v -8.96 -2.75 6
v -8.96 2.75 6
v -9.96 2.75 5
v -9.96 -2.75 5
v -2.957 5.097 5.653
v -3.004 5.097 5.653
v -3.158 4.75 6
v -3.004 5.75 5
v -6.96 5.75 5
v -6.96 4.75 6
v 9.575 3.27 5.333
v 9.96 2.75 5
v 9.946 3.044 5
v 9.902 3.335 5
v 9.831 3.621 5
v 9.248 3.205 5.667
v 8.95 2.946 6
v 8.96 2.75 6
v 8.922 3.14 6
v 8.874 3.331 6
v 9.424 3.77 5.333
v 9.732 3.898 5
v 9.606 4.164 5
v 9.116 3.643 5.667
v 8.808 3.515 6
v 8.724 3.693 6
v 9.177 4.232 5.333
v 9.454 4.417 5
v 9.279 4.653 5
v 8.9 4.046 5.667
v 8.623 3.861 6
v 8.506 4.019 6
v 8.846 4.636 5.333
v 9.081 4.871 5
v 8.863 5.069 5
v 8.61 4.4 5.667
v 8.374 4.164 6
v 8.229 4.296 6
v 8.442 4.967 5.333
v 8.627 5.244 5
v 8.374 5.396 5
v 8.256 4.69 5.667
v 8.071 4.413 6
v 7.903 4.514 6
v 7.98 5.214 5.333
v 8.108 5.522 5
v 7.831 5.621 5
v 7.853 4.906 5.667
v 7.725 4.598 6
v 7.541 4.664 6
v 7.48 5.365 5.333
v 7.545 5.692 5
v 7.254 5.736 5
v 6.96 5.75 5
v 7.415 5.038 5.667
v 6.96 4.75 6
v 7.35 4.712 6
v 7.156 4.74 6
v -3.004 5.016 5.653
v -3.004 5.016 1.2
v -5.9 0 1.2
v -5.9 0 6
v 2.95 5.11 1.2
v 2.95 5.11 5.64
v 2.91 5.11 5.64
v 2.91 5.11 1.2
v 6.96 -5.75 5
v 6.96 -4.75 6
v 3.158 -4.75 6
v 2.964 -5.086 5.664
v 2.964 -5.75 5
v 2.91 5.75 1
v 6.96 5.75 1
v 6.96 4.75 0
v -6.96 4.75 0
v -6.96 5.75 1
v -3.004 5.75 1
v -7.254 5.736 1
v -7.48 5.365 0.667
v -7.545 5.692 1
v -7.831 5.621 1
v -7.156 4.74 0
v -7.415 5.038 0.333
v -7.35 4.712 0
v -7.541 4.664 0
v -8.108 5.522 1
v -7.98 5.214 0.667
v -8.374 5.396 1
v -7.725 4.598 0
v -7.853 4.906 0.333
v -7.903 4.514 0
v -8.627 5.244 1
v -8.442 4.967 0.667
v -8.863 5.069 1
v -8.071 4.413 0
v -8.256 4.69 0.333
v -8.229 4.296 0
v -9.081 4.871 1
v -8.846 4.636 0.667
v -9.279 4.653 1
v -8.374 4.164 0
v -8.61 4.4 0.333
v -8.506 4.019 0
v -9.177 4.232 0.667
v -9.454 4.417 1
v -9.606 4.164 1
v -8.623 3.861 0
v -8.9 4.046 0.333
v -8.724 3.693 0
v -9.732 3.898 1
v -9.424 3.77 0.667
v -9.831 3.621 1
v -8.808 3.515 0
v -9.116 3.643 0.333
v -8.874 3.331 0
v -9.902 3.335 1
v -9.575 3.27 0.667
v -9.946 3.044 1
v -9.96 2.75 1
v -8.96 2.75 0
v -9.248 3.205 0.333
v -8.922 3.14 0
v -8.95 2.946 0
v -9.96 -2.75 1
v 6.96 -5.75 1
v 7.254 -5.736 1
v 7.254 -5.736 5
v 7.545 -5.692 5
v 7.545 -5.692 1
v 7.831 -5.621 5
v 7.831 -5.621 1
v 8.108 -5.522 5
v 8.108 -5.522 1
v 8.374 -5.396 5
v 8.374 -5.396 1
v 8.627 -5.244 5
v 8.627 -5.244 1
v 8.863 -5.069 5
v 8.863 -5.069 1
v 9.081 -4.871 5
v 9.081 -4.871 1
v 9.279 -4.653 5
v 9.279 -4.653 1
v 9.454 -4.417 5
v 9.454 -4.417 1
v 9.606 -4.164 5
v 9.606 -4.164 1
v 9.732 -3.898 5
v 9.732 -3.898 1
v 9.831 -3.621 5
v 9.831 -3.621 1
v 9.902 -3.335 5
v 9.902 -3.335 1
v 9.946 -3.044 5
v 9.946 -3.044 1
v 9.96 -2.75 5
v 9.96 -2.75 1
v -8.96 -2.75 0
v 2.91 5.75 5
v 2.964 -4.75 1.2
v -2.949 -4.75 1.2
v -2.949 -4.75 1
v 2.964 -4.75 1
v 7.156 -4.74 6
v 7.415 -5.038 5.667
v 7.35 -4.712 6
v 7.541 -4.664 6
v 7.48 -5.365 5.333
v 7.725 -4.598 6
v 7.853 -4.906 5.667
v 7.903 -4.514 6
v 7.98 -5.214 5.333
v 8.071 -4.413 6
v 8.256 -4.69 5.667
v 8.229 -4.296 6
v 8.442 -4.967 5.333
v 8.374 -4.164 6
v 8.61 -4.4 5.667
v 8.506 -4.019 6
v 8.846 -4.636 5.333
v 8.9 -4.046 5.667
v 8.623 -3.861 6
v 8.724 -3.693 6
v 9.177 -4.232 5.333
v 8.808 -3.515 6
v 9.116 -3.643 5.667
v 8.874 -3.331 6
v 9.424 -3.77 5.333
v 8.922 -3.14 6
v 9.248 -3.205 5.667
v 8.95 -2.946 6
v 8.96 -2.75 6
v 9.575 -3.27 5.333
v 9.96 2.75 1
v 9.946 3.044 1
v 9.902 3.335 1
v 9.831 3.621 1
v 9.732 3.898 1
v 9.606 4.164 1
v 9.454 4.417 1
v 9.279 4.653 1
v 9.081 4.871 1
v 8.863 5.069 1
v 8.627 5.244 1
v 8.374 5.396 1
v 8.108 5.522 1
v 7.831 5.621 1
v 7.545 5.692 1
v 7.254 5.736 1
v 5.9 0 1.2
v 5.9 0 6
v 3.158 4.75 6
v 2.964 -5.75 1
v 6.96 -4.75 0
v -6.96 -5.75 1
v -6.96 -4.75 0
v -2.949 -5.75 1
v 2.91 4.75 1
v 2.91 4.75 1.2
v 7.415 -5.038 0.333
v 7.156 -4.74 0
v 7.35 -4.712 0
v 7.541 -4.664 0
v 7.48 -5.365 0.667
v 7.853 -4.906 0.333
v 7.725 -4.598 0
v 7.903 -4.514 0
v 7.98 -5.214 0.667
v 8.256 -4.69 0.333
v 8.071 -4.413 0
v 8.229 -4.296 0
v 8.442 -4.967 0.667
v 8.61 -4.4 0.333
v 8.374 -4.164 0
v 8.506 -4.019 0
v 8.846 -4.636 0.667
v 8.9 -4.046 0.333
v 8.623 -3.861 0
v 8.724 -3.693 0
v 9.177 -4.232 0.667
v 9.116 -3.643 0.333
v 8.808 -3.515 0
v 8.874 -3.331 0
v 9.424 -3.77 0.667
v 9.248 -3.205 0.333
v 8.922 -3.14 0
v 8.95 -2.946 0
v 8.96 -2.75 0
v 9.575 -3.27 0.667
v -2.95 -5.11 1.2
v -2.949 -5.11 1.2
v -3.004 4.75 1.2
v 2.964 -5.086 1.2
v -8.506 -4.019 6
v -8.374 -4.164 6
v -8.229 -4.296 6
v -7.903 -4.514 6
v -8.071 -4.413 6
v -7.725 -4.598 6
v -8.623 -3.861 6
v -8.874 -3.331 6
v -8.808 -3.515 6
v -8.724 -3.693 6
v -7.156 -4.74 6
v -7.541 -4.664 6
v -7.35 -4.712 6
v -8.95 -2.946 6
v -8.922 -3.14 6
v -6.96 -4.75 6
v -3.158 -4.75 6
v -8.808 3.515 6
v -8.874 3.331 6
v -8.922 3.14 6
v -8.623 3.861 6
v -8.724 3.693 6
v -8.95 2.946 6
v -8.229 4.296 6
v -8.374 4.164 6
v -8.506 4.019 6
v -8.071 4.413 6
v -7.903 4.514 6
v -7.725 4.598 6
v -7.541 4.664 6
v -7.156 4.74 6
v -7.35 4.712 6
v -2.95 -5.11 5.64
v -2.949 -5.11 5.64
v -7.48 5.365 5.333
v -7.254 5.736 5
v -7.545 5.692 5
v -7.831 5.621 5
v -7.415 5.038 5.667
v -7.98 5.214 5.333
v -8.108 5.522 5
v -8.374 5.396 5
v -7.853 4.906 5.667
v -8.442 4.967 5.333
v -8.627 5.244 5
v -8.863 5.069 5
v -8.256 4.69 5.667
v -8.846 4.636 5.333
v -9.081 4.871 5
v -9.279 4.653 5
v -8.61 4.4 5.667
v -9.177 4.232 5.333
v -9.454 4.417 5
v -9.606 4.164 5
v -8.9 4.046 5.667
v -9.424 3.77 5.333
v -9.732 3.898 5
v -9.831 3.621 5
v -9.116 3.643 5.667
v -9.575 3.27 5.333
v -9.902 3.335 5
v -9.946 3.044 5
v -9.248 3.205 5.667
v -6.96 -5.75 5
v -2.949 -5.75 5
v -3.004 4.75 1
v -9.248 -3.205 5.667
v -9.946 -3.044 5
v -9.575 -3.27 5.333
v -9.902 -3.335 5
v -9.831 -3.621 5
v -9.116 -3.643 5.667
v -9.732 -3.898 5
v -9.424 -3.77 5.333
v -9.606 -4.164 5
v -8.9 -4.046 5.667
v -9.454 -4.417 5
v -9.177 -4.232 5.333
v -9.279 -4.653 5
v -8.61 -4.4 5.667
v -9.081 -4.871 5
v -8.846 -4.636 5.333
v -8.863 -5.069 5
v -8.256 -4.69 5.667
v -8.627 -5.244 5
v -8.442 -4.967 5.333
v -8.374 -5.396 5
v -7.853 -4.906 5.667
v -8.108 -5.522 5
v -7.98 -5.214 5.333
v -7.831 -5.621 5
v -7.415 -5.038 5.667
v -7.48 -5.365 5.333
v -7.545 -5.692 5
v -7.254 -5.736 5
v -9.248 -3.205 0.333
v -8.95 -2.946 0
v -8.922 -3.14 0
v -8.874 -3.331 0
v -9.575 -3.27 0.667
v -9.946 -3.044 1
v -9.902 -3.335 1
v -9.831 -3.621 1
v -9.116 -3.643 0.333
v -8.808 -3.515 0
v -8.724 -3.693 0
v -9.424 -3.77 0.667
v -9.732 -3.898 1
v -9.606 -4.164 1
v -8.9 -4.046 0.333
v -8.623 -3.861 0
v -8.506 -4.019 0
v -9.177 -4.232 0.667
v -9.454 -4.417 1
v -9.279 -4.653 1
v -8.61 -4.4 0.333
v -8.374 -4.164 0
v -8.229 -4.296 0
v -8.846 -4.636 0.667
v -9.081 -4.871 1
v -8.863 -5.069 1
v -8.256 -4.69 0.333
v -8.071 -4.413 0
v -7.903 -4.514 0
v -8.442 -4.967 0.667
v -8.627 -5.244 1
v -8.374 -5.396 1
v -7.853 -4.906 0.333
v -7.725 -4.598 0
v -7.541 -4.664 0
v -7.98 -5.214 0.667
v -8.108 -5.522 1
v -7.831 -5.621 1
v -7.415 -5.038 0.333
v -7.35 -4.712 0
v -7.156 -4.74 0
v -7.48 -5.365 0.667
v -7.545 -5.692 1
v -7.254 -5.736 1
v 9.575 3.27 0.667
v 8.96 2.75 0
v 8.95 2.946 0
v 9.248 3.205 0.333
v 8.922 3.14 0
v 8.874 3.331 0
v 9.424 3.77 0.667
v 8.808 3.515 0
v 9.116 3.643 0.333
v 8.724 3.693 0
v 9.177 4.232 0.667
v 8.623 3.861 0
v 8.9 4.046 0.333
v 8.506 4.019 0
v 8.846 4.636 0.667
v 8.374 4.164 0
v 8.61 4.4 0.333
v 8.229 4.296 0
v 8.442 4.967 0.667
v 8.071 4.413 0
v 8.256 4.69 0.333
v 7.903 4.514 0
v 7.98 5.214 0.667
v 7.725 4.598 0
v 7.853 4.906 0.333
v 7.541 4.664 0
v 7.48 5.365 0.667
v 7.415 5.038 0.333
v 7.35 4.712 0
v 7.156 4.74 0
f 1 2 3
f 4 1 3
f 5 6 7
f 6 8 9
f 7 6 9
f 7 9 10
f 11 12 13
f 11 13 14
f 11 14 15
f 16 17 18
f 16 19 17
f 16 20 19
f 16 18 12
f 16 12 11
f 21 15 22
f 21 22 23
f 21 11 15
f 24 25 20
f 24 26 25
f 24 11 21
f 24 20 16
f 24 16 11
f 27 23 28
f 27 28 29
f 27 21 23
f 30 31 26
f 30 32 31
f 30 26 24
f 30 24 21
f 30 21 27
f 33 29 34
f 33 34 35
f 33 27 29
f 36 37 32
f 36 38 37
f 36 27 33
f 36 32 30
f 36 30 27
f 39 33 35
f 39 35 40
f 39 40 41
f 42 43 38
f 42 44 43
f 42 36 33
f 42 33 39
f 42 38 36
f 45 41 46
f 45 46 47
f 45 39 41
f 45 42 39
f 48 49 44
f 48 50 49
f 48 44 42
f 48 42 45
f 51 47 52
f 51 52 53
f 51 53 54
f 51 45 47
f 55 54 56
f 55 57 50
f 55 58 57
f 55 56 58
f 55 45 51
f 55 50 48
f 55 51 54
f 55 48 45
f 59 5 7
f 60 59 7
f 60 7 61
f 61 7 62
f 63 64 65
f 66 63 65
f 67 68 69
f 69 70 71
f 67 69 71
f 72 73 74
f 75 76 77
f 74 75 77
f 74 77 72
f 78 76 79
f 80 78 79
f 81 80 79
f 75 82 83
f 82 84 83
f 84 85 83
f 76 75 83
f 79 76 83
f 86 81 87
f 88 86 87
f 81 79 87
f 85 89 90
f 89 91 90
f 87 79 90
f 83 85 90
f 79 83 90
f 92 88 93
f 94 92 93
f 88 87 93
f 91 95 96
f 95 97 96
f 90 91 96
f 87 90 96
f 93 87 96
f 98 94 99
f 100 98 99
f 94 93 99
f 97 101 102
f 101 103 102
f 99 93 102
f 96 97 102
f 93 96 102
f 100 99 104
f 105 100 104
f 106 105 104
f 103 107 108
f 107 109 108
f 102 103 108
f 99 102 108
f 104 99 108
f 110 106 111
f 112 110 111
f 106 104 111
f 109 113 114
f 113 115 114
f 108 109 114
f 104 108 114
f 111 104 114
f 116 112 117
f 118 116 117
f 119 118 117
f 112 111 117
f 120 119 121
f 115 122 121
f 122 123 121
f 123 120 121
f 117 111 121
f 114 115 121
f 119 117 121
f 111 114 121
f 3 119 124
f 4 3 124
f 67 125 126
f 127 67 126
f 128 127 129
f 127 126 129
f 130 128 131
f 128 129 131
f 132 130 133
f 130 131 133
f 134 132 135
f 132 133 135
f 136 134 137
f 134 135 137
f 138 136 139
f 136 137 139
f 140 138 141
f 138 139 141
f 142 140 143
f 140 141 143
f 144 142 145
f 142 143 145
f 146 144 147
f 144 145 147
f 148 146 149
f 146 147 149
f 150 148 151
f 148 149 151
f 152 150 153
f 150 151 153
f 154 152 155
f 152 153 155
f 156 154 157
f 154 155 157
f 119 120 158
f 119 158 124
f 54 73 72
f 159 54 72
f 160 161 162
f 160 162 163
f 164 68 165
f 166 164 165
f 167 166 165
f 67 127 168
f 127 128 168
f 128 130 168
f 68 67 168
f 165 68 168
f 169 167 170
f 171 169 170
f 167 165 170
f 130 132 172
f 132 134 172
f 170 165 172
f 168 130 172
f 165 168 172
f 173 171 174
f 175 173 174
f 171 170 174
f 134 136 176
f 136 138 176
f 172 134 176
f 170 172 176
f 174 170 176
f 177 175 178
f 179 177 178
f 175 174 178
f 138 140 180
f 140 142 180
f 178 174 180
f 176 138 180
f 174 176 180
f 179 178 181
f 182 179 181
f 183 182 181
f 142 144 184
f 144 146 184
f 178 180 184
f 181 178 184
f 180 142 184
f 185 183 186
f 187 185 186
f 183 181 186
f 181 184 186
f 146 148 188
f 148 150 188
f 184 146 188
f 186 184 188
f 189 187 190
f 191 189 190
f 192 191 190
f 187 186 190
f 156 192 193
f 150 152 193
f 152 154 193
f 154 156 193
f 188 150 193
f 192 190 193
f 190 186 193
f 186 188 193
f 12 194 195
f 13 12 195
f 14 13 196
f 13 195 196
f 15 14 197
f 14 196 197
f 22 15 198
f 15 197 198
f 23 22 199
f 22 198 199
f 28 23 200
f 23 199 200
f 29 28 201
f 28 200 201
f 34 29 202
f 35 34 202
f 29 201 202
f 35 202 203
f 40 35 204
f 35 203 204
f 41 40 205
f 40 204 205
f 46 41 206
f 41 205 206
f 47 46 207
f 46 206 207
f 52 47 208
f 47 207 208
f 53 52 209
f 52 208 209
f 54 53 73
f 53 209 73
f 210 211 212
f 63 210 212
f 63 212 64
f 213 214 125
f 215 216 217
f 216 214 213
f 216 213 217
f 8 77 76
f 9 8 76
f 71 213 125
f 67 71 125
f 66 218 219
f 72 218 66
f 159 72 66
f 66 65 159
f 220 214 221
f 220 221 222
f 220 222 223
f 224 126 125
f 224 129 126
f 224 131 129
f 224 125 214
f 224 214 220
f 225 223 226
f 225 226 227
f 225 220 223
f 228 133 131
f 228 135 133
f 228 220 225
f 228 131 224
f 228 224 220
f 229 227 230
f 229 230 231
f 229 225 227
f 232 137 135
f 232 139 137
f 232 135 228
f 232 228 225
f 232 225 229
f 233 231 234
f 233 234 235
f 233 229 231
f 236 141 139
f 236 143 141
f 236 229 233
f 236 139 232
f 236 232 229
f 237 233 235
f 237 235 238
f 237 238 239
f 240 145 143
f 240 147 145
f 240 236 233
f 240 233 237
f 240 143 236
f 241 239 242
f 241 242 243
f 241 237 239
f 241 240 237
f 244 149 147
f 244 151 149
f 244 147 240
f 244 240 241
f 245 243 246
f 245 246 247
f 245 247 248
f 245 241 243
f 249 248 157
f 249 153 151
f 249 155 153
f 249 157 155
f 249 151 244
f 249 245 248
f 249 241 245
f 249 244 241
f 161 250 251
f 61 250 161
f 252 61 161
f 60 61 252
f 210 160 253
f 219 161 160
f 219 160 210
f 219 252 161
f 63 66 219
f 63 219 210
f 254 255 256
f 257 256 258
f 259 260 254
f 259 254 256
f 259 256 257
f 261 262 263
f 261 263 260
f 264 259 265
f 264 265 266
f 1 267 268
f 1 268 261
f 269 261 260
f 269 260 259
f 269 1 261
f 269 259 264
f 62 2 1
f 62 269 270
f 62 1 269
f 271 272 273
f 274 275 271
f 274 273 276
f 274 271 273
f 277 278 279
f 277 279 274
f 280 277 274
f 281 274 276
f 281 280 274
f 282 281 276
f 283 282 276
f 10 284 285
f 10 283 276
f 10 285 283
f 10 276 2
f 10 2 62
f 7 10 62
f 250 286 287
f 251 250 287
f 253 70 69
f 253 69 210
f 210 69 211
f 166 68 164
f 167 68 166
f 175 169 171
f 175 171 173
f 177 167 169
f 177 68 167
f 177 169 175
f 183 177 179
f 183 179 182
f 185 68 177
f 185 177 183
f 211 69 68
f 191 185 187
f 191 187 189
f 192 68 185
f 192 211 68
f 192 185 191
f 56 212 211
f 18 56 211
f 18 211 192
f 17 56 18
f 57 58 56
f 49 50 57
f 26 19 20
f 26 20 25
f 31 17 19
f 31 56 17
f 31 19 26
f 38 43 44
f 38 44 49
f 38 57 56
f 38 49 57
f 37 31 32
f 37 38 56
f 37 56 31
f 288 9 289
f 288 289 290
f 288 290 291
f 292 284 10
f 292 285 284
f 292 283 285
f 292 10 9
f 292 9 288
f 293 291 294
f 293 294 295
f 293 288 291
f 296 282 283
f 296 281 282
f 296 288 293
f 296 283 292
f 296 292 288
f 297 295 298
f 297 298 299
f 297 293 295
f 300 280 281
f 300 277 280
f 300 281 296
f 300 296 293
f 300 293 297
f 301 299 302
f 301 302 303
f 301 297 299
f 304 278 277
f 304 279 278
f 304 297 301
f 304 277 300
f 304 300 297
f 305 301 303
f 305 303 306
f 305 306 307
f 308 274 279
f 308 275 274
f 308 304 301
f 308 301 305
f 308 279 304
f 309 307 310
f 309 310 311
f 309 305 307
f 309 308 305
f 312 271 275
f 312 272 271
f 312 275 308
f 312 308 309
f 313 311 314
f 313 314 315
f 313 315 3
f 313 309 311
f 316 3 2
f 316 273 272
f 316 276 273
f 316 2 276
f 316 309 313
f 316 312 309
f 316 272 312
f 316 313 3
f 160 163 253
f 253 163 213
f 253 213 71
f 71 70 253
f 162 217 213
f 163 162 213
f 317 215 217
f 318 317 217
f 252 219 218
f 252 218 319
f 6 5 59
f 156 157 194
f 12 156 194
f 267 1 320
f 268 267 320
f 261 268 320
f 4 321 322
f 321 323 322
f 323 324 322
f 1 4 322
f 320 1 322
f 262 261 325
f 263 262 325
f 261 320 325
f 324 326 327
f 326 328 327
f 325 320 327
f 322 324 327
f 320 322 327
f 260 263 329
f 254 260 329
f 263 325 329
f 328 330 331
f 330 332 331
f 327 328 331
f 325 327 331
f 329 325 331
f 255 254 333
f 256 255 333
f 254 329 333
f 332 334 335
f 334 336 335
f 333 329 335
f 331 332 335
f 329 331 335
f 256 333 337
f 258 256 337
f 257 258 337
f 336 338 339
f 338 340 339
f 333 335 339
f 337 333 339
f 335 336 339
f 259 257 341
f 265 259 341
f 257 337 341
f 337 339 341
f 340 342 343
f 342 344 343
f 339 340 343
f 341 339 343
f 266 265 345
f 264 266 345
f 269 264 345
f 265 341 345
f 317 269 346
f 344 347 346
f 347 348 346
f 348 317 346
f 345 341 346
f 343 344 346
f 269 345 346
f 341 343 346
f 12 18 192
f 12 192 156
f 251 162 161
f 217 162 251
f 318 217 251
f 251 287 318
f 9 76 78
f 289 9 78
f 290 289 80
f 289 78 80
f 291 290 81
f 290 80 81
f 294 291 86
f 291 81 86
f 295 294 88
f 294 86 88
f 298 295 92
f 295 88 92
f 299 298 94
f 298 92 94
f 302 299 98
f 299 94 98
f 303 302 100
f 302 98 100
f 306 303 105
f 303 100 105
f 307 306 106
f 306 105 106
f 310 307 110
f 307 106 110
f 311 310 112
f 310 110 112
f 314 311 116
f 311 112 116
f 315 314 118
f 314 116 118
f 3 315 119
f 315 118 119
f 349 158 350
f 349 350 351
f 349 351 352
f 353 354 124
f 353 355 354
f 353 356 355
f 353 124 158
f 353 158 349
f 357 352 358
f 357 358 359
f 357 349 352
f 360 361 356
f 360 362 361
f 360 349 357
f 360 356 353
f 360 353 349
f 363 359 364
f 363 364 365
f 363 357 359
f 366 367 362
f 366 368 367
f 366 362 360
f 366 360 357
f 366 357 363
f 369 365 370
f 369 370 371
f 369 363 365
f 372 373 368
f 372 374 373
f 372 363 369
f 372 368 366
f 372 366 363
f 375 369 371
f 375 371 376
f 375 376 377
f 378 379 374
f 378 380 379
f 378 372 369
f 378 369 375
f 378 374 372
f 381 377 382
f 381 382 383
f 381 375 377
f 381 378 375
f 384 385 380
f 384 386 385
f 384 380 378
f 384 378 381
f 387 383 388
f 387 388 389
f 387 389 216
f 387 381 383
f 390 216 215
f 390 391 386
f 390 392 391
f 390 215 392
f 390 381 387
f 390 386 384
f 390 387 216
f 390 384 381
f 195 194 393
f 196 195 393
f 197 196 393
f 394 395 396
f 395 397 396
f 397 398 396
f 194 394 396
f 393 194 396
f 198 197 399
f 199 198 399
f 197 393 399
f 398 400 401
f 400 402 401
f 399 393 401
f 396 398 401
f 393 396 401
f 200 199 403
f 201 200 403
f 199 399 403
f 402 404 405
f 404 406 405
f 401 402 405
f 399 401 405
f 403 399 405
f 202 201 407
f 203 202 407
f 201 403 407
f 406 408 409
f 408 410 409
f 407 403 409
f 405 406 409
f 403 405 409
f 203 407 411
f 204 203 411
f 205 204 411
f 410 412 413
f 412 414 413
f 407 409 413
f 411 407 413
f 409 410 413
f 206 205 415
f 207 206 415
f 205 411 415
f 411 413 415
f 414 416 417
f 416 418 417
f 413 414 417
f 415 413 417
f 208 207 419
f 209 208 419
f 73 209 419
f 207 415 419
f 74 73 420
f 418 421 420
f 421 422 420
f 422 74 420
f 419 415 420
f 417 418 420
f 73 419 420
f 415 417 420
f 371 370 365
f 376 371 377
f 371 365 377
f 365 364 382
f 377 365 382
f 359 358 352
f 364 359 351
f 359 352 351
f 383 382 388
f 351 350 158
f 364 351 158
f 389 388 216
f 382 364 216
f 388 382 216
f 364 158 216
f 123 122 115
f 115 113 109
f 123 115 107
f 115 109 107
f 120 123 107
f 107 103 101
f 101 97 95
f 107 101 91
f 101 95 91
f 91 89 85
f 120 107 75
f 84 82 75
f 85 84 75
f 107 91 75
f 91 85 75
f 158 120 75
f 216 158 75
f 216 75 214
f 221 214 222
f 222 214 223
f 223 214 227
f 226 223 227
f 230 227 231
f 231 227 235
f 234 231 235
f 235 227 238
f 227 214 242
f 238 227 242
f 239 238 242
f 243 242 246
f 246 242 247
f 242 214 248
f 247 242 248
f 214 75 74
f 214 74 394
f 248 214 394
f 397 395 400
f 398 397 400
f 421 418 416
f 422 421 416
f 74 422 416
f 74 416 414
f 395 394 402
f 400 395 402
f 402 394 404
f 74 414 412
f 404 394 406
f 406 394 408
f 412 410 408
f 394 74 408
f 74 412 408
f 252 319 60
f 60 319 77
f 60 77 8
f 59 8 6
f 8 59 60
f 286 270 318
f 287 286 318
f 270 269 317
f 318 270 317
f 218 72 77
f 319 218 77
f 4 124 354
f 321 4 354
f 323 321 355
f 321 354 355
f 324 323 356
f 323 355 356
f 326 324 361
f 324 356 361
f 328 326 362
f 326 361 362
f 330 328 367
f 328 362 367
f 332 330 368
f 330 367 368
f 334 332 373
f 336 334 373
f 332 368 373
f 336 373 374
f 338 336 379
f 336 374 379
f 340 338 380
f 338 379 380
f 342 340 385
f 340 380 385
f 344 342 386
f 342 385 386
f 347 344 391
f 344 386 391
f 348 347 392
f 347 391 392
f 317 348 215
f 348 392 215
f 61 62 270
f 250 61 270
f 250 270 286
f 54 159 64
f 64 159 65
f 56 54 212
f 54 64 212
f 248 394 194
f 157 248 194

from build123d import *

# Parameters (mm, degrees)
F1_DEPTH     = 6
F3_DEPTH     = 4.8
F4_T1_DEPTH  = 13.92
F4_T3_DEPTH  = 5.5
F4_T6_ANGLE  = 90
F4_T8_ANGLE  = 90
F4_T10_ANGLE = 90
F4_T12_ANGLE = 90
F4_T14_ANGLE = 90
F4_T16_ANGLE = 90
F4_T18_ANGLE = 90
F4_T20_ANGLE = 90
F5_W         = 5.9125532862
F5_H         = 4.6649316102
F6_DEPTH     = 1
F7_W         = 5.9137202334
F7_H         = 4.6533403695
F8_DEPTH     = 1


# Not quite as in the source:
# - a fillet or chamfer that OpenCascade refuses, or shapes differently, is made with other operations: its cross-section is extruded or revolved along the edge and cut away or added


with BuildPart() as f1:
    # F0 (on Top) → F1 (new body)
    with BuildSketch(Plane.XY):
        with BuildLine():
            Line((6.96, 5.75), (-6.96, 5.75))
            ThreePointArc((-6.96, 5.75), (-9.0813203436, 4.8713203436), (-9.96, 2.75))
            Line((-9.96, 2.75), (-9.96, -2.75))
            ThreePointArc((-9.96, -2.75), (-9.0813203436, -4.8713203436), (-6.96, -5.75))
            Line((-6.96, -5.75), (6.96, -5.75))
            ThreePointArc((6.96, -5.75), (9.0813203436, -4.8713203436), (9.96, -2.75))
            Line((9.96, -2.75), (9.96, 2.75))
            ThreePointArc((9.96, 2.75), (9.0813203436, 4.8713203436), (6.96, 5.75))
        make_face()
    extrude(amount=F1_DEPTH)

    # F2 (on face) → F3 (cut)
    with BuildSketch(Plane.XY.offset(6)):
        Polygon((2.95, 5.1095498823), (-2.95, 5.1095498823), (-5.9, 0), (-2.95, -5.1095498823), (2.95, -5.1095498823), (5.9, 0), align=None)
    extrude(amount=-F3_DEPTH, mode=Mode.SUBTRACT)

    # F4: chamfer of 1 on 2 edges, made by hand

    # F4_s2 → F4_t1 (cut)
    with BuildSketch(Plane.YZ.offset(-6.96)):
        Polygon((5.75, 5), (4.75, 6), (5.75, 6), align=None)
        Polygon((5.75, 1), (4.75, 0), (5.75, 0), align=None)
        Polygon((-4.75, 0), (-5.75, 1), (-5.75, 0), align=None)
        Polygon((-4.75, 6), (-5.75, 5), (-5.75, 6), align=None)
    extrude(amount=F4_T1_DEPTH, mode=Mode.SUBTRACT)

    # F4_s4 → F4_t3 (cut)
    with BuildSketch(Plane.XZ.offset(-2.75)):
        Polygon((-8.96, 0), (-9.96, 1), (-9.96, 0), align=None)
        Polygon((8.96, 0), (9.96, 1), (9.96, 0), align=None)
        Polygon((-8.96, 6), (-9.96, 5), (-9.96, 6), align=None)
        Polygon((8.96, 6), (9.96, 5), (9.96, 6), align=None)
    extrude(amount=F4_T3_DEPTH, mode=Mode.SUBTRACT)

    # F4_s5 → F4_t6 (revolve, cut)
    with BuildSketch(Plane.XZ.offset(-2.75)):
        Polygon((9.96, 1), (8.96, 0), (9.96, 0), align=None)
    revolve(axis=Axis((6.96, 2.75, 0), (0, 0, 1)), revolution_arc=F4_T6_ANGLE, mode=Mode.SUBTRACT)

    # F4_s7 → F4_t8 (revolve, cut)
    with BuildSketch(Plane.YZ.offset(-6.96)):
        Polygon((5.75, 1), (4.75, 0), (5.75, 0), align=None)
    revolve(axis=Axis((-6.96, 2.75, 0), (0, 0, 1)), revolution_arc=F4_T8_ANGLE, mode=Mode.SUBTRACT)

    # F4_s9 → F4_t10 (revolve, cut)
    with BuildSketch(Plane.XZ.offset(2.75)):
        Polygon((-8.96, 0), (-9.96, 1), (-9.96, 0), align=None)
    revolve(axis=Axis((-6.96, -2.75, 0), (0, 0, 1)), revolution_arc=F4_T10_ANGLE, mode=Mode.SUBTRACT)

    # F4_s11 → F4_t12 (revolve, cut)
    with BuildSketch(Plane.YZ.offset(6.96)):
        Polygon((-4.75, 0), (-5.75, 1), (-5.75, 0), align=None)
    revolve(axis=Axis((6.96, -2.75, 0), (0, 0, 1)), revolution_arc=F4_T12_ANGLE, mode=Mode.SUBTRACT)

    # F4_s13 → F4_t14 (revolve, cut)
    with BuildSketch(Plane.XZ.offset(-2.75)):
        Polygon((9.96, 5), (8.96, 6), (9.96, 6), align=None)
    revolve(axis=Axis((6.96, 2.75, 6), (0, 0, 1)), revolution_arc=F4_T14_ANGLE, mode=Mode.SUBTRACT)

    # F4_s15 → F4_t16 (revolve, cut)
    with BuildSketch(Plane.YZ.offset(-6.96)):
        Polygon((5.75, 5), (4.75, 6), (5.75, 6), align=None)
    revolve(axis=Axis((-6.96, 2.75, 6), (0, 0, 1)), revolution_arc=F4_T16_ANGLE, mode=Mode.SUBTRACT)

    # F4_s17 → F4_t18 (revolve, cut)
    with BuildSketch(Plane.XZ.offset(2.75)):
        Polygon((-8.96, 6), (-9.96, 5), (-9.96, 6), align=None)
    revolve(axis=Axis((-6.96, -2.75, 6), (0, 0, 1)), revolution_arc=F4_T18_ANGLE, mode=Mode.SUBTRACT)

    # F4_s19 → F4_t20 (revolve, cut)
    with BuildSketch(Plane.YZ.offset(6.96)):
        Polygon((-4.75, 6), (-5.75, 5), (-5.75, 6), align=None)
    revolve(axis=Axis((6.96, -2.75, 6), (0, 0, 1)), revolution_arc=F4_T20_ANGLE, mode=Mode.SUBTRACT)

    # F5 (on face) → F6 (cut)
    with BuildSketch(Plane.XZ.offset(5.75)):
        with Locations((0.007480965, 3.3324658051)):
            Rectangle(F5_W, F5_H)
    extrude(amount=-F6_DEPTH, mode=Mode.SUBTRACT)

    # F7 (on face) → F8 (cut)
    with BuildSketch(Plane(origin=(0, 5.75, 0), x_dir=(-1, 0, 0), z_dir=(0, 1, 0))):
        with Locations((0.0472323736, 3.3266701847)):
            Rectangle(F7_W, F7_H)
    extrude(amount=-F8_DEPTH, mode=Mode.SUBTRACT)


solid = f1.part
